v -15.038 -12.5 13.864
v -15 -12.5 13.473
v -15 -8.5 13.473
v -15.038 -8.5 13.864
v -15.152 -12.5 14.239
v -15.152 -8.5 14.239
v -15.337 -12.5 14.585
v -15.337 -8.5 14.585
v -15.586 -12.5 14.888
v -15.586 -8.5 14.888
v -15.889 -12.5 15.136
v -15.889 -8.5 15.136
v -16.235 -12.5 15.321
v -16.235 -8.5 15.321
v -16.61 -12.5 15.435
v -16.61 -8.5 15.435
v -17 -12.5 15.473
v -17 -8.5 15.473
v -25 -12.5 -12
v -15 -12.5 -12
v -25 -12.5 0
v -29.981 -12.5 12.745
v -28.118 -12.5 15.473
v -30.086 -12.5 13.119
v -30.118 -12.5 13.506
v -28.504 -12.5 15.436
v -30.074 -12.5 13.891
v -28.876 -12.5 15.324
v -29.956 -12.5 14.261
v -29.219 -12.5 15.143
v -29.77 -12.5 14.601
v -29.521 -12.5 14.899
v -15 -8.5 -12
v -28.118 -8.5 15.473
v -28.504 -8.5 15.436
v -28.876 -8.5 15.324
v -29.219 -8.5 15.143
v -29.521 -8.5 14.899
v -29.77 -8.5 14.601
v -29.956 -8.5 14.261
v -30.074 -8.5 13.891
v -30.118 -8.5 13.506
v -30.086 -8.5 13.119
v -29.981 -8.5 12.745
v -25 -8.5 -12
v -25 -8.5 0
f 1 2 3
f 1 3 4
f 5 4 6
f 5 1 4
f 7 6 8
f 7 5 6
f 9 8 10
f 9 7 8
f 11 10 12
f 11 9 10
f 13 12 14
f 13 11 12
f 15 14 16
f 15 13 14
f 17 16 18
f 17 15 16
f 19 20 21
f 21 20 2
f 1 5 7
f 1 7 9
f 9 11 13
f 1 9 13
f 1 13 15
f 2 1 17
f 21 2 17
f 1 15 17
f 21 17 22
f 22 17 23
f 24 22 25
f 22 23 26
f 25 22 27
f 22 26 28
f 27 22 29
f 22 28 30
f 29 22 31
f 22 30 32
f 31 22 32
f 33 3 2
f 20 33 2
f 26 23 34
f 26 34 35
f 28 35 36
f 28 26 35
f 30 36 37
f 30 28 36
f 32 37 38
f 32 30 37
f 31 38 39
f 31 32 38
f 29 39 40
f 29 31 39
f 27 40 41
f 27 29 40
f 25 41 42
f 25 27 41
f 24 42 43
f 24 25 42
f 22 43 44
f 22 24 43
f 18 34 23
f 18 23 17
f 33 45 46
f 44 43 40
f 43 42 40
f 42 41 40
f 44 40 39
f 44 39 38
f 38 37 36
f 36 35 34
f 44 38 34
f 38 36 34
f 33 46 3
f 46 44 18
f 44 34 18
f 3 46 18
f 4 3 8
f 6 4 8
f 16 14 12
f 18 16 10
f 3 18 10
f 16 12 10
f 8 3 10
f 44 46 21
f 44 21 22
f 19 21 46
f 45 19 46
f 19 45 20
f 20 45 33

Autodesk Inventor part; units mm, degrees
ref_plane "YZ Plane" through (0, 0, 0) normal (1, 0, 0) x (0, 1, 0)
ref_plane "XZ Plane" through (0, 0, 0) normal (0, 1, 0) x (-1, 0, 0)
ref_plane "XY Plane" through (0, 0, 0) normal (0, 0, 1) x (1, 0, 0)
sketch "Эскиз1" plane through (0, 0, 0) normal (0, 0, 1) x (1, 0, 0)
  line L0 (-25, -12.5) -> (-25, -8.5) projected
  line L1 (-15, -12.5) -> (-25, -12.5) projected
  line L2 (-25, -8.5) -> (-15, -8.5) projected
  line L3 (-15, -8.5) -> (-15, -12.5) projected
  point P0 (0, 0)
extrude "Выдавливание1" add sketch "Эскиз1" against normal blind 12
sketch "Эскиз2" plane through (-25, -8.5, 0) normal (0, 1, 0) x (1, 0, 0)
  line L0 (-6.047, -15.4734) -> (10, -15.4734)
  line L1 (10, -15.4734) -> (10, 0)
  line L2 (0, 0) -> (10, 0) projected
  line L3 (0, 0) -> (-6.047, -15.4734)
  line L4 (0, 0) -> (10, 0)
  point P0 (25, 0)
extrude "Выдавливание2" add sketch "Эскиз2" against normal blind 4
fillet "Сопряжение1" radius 2 2 edges at (-15, -10.5, 15.4734) (-31.047, -10.5, 15.4734)
properties part number "footbtn"
